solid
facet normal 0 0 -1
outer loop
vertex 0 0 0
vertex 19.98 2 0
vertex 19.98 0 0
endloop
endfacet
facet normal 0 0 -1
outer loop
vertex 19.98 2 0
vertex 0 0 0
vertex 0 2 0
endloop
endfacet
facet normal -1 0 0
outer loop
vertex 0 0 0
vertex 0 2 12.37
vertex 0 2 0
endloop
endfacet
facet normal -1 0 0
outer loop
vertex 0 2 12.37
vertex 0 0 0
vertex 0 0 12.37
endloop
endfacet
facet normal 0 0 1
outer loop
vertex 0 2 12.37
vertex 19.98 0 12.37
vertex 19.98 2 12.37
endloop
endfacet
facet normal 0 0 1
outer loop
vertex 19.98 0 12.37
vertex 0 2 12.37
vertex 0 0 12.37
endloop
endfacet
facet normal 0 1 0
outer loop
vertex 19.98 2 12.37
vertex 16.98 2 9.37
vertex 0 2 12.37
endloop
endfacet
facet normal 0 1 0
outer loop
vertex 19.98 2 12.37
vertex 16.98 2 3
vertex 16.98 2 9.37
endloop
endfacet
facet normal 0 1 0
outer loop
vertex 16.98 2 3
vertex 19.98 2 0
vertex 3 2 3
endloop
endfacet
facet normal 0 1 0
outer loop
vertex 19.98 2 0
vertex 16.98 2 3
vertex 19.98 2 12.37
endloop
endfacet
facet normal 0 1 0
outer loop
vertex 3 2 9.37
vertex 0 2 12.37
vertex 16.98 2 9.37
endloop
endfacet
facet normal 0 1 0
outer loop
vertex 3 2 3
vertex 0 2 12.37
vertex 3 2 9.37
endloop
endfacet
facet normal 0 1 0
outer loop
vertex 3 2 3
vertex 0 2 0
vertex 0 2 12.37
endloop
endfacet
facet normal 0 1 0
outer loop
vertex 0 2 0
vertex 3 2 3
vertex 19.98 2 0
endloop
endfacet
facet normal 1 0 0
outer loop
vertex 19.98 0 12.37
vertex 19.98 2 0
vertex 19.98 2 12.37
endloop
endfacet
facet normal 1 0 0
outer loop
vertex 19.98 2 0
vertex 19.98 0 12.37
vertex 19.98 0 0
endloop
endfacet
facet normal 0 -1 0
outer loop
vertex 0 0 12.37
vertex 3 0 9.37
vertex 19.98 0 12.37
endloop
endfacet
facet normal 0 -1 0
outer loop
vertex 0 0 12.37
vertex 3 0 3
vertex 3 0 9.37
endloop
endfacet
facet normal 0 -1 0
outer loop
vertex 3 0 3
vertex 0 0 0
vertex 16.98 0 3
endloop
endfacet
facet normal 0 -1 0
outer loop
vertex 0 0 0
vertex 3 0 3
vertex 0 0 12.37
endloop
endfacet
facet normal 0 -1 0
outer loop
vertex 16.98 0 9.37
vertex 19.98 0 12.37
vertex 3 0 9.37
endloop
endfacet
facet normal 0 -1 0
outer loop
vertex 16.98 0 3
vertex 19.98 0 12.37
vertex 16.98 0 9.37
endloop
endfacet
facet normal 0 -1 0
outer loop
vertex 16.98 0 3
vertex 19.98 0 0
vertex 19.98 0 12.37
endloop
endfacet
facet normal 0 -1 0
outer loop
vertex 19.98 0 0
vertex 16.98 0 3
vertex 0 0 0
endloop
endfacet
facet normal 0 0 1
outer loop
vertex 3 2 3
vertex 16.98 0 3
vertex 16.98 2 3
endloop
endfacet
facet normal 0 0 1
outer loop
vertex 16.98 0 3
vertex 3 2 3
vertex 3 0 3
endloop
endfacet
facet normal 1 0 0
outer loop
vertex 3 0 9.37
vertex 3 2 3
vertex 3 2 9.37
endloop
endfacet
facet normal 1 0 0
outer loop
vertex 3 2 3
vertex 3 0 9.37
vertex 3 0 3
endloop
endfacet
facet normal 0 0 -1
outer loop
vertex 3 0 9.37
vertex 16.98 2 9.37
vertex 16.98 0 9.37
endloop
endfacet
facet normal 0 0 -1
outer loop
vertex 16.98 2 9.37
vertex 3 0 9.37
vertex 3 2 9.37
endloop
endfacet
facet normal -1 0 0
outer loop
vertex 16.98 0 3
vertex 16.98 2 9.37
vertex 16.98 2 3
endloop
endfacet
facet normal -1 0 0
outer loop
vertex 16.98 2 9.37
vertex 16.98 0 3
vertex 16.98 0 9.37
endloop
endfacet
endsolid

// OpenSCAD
// preview[view:south east, tilt:top diagonal]



/* [Dimensions] */

// Width of the ring.
margin = 3;

// Width of the inner space. Wiggle is applied.
widthInner = 13.33;

// Height of the inner space. Wiggle is applied.
heightInner = 5.72;

// Depth of the whole thing.
depth = 2;



/* [Extras] */

// Extra room on inner side. If you took exact measurements you want to add some extra space for easier handling.
wiggle = 0.65; // [0:None, 0.55:Tight, 0.65:Little bit, 0.75:More, 0.85:A lot]



/* [Hidden] */

_widthInner = widthInner + wiggle;
_heightInner = heightInner + wiggle;

width = _widthInner + 2*margin;
height = _heightInner + 2*margin;



PanelMount();

module PanelMount() {
    difference() {
        Panel();
        translate([margin, 0, margin]) Hole();
    }
}

module Panel() {
    Block(width, depth, height);
}

module Hole() {
    Block(_widthInner, depth, _heightInner);
}



module Block(x = 1, y = 1, z = 1) {
    linear_extrude(height = z, convexity = 4)
        square(size = [x, y], center = false);
}
